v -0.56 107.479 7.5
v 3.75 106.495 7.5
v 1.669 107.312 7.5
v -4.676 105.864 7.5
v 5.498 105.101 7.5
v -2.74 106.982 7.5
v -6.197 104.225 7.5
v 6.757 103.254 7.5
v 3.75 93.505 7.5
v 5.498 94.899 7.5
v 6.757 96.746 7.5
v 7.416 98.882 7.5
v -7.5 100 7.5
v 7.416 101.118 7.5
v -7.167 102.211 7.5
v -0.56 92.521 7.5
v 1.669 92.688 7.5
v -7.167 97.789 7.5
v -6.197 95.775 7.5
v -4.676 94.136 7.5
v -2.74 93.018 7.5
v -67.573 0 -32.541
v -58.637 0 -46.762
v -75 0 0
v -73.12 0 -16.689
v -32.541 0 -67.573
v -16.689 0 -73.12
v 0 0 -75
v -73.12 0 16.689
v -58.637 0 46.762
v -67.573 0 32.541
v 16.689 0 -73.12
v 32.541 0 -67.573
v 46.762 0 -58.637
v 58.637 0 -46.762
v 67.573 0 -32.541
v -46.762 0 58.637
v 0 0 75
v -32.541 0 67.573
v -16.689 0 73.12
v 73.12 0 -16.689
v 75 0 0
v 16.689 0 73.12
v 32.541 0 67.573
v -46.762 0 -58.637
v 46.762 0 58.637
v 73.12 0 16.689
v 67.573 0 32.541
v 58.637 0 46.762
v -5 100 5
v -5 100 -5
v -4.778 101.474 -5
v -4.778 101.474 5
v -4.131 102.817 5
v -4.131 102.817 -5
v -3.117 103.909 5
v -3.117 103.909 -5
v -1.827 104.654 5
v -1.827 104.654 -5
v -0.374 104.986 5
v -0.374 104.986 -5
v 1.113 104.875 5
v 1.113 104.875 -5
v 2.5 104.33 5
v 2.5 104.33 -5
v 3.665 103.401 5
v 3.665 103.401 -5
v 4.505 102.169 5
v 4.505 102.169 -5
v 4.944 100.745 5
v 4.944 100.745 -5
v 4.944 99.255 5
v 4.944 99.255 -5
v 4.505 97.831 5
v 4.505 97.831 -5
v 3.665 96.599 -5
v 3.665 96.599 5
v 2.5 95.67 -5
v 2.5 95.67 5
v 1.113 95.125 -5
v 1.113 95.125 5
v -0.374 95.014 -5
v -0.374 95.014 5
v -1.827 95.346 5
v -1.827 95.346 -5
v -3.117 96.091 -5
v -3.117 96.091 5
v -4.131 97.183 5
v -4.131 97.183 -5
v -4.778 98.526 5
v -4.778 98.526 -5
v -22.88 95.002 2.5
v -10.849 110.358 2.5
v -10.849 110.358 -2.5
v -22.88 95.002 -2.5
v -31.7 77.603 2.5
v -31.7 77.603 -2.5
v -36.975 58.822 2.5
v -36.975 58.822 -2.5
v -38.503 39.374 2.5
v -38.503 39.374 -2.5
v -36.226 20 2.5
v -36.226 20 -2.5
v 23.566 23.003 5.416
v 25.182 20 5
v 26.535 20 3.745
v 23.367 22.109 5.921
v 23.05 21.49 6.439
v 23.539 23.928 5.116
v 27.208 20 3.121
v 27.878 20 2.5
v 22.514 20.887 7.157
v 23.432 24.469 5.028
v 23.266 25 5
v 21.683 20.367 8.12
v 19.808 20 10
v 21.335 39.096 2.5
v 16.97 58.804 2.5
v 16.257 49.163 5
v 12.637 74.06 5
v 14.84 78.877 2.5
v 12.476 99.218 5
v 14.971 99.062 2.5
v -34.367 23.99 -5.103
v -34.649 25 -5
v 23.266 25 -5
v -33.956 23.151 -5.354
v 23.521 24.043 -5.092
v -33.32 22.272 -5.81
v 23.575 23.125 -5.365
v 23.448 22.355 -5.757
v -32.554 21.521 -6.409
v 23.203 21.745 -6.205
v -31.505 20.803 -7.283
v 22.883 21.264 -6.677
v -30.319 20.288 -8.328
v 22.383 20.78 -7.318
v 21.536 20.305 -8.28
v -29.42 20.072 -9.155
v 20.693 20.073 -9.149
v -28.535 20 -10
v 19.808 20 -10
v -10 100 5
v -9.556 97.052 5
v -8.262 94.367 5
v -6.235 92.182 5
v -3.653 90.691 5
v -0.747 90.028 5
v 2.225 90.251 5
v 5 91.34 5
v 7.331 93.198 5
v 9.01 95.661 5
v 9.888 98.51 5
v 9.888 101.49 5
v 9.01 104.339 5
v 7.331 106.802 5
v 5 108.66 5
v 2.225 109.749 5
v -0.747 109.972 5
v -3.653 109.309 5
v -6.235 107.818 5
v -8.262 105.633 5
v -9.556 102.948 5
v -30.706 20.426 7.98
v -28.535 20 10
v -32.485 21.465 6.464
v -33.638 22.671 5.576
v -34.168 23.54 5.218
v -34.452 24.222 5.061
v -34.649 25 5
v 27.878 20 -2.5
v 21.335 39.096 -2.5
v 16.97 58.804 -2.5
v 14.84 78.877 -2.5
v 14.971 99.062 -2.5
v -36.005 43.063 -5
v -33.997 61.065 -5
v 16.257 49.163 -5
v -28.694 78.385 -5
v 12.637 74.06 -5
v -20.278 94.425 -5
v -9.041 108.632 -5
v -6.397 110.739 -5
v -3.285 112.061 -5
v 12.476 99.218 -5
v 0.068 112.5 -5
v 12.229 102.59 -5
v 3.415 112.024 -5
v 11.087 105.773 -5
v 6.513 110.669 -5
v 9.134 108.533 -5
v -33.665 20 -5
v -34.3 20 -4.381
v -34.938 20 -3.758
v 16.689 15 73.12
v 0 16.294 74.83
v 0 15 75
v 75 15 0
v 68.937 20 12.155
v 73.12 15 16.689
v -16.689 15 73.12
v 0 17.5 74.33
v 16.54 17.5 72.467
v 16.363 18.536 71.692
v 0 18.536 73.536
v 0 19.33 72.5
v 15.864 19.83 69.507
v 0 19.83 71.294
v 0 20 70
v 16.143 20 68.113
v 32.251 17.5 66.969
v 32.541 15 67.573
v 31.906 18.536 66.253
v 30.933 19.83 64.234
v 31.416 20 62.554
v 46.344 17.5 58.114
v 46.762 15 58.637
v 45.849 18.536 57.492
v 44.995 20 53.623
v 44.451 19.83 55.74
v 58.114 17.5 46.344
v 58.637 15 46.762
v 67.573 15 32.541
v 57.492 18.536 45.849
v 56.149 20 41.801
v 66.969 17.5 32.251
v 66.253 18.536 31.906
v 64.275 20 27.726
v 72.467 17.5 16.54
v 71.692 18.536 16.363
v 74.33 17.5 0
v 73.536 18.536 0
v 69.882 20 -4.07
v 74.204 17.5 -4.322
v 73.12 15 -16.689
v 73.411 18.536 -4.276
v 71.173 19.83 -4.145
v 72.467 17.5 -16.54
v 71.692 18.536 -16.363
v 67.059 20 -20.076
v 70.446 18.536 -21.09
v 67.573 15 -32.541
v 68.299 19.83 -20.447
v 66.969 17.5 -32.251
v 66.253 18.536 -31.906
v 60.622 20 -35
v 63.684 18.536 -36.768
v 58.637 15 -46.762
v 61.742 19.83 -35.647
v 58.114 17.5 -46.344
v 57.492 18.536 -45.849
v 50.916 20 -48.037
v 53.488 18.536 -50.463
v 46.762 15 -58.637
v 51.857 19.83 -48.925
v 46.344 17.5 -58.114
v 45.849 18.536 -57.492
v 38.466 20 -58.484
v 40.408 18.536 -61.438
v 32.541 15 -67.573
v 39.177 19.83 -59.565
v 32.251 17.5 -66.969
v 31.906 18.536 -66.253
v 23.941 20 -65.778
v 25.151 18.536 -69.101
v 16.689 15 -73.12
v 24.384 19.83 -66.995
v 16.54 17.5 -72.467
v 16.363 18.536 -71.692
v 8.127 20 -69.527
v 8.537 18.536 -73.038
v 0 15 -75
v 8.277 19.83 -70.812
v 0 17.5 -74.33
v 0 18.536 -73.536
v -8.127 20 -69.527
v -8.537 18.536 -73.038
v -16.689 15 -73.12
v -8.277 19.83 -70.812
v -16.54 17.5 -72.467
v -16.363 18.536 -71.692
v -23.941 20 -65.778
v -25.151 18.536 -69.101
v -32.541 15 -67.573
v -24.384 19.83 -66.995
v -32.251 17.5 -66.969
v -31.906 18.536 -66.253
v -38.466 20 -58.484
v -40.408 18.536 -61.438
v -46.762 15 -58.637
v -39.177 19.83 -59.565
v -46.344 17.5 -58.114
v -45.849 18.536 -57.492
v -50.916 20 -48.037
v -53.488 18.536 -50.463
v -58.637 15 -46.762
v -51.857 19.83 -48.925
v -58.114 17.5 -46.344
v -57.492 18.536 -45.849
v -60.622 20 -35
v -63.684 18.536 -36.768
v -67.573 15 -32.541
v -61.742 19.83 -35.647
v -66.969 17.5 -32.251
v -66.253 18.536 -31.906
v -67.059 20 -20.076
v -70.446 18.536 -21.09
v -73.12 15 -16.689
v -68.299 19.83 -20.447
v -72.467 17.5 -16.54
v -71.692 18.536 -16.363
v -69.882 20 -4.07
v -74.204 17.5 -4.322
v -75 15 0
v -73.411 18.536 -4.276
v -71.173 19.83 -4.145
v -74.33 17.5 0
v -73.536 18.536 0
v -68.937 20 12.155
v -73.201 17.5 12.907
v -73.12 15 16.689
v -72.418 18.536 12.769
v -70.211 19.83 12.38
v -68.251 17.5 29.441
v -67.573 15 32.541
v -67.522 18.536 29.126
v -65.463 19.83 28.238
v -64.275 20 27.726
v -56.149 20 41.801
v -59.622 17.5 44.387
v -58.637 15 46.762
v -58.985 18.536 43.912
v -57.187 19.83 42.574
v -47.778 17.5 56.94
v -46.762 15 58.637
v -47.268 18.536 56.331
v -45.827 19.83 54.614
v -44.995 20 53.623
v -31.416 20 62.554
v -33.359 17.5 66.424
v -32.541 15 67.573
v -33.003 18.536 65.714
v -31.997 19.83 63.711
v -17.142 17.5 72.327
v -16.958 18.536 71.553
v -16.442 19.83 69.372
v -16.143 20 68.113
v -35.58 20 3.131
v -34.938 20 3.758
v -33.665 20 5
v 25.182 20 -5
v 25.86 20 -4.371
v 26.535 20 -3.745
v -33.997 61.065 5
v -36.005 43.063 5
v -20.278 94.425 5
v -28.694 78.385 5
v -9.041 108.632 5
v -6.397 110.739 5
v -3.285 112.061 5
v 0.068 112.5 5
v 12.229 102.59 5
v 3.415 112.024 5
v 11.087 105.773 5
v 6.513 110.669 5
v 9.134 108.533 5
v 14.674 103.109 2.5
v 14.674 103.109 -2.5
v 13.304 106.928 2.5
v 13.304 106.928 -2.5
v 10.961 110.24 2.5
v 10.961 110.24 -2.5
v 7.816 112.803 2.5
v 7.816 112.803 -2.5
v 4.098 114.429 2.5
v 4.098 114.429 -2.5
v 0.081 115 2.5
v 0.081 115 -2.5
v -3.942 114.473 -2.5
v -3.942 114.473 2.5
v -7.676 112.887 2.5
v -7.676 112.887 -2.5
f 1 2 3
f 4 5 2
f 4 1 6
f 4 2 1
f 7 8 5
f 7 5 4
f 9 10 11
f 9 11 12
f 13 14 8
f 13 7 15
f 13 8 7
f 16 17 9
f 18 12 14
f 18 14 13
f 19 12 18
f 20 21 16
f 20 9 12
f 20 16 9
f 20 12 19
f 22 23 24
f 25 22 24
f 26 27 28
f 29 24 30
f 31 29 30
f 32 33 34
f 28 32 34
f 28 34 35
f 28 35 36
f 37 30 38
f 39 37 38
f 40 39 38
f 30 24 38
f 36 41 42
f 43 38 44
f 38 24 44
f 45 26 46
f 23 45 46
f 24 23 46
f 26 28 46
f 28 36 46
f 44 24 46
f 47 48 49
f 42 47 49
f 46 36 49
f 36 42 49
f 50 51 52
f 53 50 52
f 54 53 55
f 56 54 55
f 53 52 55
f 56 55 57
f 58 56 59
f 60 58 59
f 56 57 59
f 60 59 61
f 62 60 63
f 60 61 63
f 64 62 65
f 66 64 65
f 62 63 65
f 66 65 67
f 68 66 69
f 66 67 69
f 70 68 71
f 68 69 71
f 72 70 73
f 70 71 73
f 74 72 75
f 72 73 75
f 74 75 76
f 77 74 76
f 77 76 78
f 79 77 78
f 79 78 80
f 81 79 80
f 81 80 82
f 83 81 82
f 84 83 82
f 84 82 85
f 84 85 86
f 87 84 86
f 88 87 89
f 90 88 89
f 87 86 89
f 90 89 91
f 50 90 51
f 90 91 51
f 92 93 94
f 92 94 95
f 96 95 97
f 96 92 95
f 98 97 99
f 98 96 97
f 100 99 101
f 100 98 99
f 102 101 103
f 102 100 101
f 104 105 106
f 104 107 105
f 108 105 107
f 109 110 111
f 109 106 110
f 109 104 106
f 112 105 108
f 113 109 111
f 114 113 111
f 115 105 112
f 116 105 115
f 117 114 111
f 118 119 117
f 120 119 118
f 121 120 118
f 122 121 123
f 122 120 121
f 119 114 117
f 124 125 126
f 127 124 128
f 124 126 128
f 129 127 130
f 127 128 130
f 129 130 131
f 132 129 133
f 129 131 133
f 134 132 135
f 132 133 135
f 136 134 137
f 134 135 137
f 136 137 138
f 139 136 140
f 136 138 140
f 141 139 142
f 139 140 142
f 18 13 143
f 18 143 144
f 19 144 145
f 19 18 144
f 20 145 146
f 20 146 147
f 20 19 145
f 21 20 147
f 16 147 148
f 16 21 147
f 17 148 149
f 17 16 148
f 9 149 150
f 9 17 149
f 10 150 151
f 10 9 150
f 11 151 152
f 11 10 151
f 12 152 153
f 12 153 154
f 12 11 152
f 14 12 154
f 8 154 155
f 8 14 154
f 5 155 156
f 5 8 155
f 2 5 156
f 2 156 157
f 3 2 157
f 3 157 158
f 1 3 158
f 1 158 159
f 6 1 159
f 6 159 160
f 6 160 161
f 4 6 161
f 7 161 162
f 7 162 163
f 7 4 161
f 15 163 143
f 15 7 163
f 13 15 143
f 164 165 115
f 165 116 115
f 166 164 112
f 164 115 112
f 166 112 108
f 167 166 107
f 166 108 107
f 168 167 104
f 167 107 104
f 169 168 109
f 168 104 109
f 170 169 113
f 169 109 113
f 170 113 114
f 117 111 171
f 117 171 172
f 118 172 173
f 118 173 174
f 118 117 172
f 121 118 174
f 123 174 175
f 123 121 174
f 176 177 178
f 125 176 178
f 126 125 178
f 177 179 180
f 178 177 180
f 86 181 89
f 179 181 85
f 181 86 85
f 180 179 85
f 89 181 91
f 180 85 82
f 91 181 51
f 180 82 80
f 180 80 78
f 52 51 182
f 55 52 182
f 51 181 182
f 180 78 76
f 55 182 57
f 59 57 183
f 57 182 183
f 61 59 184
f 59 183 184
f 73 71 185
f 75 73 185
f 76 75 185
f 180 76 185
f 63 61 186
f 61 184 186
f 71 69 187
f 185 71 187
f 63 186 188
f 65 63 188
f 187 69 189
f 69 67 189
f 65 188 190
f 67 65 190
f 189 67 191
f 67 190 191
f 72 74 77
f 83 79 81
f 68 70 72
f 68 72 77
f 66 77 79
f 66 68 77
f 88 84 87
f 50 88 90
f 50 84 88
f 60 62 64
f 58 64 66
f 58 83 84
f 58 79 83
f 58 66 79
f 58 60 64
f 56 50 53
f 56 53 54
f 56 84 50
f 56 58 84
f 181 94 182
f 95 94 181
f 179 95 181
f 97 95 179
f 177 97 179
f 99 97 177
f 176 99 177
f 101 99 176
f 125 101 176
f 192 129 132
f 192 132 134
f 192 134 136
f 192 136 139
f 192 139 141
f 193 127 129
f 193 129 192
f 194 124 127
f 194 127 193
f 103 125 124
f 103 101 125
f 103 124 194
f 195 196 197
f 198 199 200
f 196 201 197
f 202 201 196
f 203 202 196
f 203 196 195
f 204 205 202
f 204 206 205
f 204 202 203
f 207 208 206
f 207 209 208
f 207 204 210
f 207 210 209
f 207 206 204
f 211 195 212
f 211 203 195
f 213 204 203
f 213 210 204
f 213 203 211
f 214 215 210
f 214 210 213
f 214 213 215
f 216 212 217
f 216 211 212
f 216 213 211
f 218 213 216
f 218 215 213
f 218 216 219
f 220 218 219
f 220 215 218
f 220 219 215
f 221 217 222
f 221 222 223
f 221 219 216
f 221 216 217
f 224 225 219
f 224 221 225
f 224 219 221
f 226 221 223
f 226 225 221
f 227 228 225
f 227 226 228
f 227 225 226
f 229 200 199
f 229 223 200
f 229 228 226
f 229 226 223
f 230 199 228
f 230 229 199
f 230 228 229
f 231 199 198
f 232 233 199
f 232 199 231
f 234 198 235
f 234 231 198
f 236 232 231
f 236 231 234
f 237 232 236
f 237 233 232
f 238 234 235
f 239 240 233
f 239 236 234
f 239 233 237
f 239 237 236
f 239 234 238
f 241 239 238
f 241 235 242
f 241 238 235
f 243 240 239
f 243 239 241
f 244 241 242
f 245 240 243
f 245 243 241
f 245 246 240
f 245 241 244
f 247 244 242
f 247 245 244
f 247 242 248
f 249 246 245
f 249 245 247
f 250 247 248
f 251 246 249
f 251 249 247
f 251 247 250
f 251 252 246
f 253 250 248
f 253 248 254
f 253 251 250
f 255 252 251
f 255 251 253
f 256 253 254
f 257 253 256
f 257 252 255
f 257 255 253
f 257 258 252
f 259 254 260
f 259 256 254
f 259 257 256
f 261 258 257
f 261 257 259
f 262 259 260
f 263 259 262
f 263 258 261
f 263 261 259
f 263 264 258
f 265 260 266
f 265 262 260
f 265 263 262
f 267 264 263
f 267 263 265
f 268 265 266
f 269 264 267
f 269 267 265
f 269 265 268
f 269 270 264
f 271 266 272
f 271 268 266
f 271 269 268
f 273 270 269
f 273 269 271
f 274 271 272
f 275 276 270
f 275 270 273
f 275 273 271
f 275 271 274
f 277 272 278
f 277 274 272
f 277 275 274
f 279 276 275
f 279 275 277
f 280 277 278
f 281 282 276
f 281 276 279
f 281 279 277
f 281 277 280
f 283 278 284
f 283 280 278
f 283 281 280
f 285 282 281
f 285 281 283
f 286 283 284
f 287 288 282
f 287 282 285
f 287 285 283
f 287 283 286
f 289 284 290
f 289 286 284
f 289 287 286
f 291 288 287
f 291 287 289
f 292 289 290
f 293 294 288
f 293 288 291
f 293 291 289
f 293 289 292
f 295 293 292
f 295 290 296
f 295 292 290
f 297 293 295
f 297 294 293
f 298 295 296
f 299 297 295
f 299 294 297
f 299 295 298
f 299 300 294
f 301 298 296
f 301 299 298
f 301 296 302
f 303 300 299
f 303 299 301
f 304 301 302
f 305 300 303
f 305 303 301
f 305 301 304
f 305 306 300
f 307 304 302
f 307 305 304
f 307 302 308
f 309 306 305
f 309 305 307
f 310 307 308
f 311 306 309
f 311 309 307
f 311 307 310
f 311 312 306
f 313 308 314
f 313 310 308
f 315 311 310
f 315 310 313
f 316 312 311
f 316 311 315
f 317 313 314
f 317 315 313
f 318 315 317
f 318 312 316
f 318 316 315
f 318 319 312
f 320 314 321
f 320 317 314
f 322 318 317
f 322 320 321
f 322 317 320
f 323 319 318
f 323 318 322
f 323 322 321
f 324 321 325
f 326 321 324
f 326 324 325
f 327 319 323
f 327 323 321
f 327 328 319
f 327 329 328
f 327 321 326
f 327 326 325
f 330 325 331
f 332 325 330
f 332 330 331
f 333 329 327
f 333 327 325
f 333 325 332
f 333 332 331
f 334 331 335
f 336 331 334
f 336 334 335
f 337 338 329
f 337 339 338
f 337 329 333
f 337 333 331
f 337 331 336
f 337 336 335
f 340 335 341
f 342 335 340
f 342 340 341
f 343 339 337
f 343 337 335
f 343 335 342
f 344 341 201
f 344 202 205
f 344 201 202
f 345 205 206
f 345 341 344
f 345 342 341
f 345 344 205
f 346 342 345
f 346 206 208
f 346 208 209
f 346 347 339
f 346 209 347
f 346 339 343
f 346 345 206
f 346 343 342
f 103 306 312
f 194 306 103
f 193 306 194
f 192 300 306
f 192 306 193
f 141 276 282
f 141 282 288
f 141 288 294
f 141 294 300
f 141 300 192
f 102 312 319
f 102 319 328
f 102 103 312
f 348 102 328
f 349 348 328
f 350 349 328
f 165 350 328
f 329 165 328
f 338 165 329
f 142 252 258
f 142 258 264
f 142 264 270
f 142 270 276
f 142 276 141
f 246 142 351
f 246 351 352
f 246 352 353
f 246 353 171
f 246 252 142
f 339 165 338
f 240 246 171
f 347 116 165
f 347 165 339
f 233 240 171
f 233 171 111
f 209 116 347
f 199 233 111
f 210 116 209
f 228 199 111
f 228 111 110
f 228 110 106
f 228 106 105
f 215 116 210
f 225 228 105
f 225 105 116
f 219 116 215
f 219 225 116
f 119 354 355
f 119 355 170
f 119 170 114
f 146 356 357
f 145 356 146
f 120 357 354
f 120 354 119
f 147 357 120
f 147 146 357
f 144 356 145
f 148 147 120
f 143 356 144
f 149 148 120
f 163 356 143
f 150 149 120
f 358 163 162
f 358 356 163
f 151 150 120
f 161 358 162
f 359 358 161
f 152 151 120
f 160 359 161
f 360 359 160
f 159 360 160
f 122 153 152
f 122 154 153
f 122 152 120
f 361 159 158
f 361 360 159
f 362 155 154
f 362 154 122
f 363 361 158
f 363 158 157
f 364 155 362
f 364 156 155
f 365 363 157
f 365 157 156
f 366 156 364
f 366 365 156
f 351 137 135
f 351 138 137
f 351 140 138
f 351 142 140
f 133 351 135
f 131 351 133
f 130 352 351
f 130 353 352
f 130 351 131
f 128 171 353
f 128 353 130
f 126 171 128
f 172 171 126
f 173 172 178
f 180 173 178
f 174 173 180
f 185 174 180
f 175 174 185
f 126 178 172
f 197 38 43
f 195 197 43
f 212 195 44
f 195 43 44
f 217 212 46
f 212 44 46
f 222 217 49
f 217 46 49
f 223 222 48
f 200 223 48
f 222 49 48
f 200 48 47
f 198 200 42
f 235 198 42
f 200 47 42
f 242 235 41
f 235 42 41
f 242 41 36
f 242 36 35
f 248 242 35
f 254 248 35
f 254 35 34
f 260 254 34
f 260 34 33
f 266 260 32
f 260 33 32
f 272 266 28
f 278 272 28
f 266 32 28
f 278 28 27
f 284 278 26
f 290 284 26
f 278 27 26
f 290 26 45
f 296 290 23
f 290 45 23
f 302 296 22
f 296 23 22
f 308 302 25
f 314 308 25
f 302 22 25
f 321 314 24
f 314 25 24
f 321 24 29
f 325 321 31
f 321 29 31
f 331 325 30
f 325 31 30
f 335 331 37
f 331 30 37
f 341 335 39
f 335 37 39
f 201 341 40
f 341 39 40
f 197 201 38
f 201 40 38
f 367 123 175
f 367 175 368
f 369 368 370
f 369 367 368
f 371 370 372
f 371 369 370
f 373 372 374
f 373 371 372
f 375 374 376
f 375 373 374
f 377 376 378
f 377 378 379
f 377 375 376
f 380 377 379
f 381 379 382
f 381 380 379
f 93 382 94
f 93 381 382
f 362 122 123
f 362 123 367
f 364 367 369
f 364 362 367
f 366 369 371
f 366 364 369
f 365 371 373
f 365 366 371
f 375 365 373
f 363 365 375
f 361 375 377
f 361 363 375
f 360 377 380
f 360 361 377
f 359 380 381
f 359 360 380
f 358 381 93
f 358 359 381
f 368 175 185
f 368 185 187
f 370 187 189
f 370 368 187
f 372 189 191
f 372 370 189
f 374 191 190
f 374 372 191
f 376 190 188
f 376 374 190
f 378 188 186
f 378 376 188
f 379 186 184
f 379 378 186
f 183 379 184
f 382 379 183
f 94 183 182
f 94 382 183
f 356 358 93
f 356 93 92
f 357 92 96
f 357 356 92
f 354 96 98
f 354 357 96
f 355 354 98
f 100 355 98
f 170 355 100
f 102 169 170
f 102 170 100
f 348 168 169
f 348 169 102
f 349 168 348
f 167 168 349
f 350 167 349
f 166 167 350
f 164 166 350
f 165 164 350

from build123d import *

# Parameters (mm, degrees)
SKETCH2_R           = 75
BOSS_EXTRUDE1_DEPTH = 20
FILLET1_R           = 5
BOSS_EXTRUDE2_DEPTH = 5
CHAMFER4_SIZE       = 2.5
FILLET2_R           = 5
SKETCH7_R           = 10
BOSS_EXTRUDE3_DEPTH = 2.5
CHAMFER5_SIZE       = 2.5
SKETCH8_R           = 5
CUT_EXTRUDE1_DEPTH  = 10


with BuildPart() as part:
    # Sketch2 → Boss-Extrude1 (new body)
    with BuildSketch(Plane(origin=(0, 0, 0), x_dir=(1, 0, 0), z_dir=(0, 1, 0))):
        with Locations(Location((0, 0, 0), (0, 0, 270))):
            Circle(SKETCH2_R)
    extrude(amount=BOSS_EXTRUDE1_DEPTH)

    # Fillet1
    fillet1_edges = [part.edges().sort_by_distance(p)[0] for p in [
        (0, 20, -75),
    ]]
    fillet(fillet1_edges, radius=FILLET1_R)

    # Sketch3 → Boss-Extrude2 (add, symmetric)
    with BuildSketch(Plane.XY):
        with BuildLine():
            Line((-35, 15), (30, 15))
            ThreePointArc((30, 15), (17.428098582, 56.126843631), (14.970645506, 99.06203778))
            ThreePointArc((14.970645506, 99.06203778), (6.012327577, 113.742340307), (-10.849201429, 110.358321696))
            ThreePointArc((-10.849201429, 110.358321696), (-35.460543036, 65.854059614), (-35, 15))
        make_face()
    extrude(amount=BOSS_EXTRUDE2_DEPTH, both=True)

    # Chamfer4
    chamfer4_edges = [part.edges().sort_by_distance(p)[0] for p in [
        (-34.796467261, 68.341174934, -5),
        (16.970295051, 58.803839559, -5),
        (6.012327577, 113.742340307, -5),
        (16.970295051, 58.803839559, 5),
        (6.012327577, 113.742340307, 5),
        (-34.796467261, 68.341174934, 5),
    ]]
    chamfer(chamfer4_edges, length=CHAMFER4_SIZE)

    # Fillet2
    fillet2_edges = [part.edges().sort_by_distance(p)[0] for p in [
        (-4.241511046, 20, 5),
        (-4.241511046, 20, -5),
    ]]
    fillet(fillet2_edges, radius=FILLET2_R)

    # Sketch7 → Boss-Extrude3 (add, symmetric)
    with BuildSketch(Plane.XY.offset(5)):
        with Locations(Location((0, 100, 0), (0, 0, 180))):
            Circle(SKETCH7_R)
    extrude(amount=BOSS_EXTRUDE3_DEPTH, both=True)

    # Chamfer5
    chamfer5_edges = [part.edges().sort_by_distance(p)[0] for p in [
        (10, 100, 7.5),
    ]]
    chamfer(chamfer5_edges, length=CHAMFER5_SIZE - 0.0001)  # a hair under: the kernel refuses the full size

    # Sketch8 → Cut-Extrude1 (cut)
    with BuildSketch(Plane(origin=(0, 0, -5), x_dir=(-1, 0, 0), z_dir=(0, 0, -1))):
        with Locations((0, 100)):
            Circle(SKETCH8_R)
    extrude(amount=-CUT_EXTRUDE1_DEPTH, mode=Mode.SUBTRACT)


solid = part.part
